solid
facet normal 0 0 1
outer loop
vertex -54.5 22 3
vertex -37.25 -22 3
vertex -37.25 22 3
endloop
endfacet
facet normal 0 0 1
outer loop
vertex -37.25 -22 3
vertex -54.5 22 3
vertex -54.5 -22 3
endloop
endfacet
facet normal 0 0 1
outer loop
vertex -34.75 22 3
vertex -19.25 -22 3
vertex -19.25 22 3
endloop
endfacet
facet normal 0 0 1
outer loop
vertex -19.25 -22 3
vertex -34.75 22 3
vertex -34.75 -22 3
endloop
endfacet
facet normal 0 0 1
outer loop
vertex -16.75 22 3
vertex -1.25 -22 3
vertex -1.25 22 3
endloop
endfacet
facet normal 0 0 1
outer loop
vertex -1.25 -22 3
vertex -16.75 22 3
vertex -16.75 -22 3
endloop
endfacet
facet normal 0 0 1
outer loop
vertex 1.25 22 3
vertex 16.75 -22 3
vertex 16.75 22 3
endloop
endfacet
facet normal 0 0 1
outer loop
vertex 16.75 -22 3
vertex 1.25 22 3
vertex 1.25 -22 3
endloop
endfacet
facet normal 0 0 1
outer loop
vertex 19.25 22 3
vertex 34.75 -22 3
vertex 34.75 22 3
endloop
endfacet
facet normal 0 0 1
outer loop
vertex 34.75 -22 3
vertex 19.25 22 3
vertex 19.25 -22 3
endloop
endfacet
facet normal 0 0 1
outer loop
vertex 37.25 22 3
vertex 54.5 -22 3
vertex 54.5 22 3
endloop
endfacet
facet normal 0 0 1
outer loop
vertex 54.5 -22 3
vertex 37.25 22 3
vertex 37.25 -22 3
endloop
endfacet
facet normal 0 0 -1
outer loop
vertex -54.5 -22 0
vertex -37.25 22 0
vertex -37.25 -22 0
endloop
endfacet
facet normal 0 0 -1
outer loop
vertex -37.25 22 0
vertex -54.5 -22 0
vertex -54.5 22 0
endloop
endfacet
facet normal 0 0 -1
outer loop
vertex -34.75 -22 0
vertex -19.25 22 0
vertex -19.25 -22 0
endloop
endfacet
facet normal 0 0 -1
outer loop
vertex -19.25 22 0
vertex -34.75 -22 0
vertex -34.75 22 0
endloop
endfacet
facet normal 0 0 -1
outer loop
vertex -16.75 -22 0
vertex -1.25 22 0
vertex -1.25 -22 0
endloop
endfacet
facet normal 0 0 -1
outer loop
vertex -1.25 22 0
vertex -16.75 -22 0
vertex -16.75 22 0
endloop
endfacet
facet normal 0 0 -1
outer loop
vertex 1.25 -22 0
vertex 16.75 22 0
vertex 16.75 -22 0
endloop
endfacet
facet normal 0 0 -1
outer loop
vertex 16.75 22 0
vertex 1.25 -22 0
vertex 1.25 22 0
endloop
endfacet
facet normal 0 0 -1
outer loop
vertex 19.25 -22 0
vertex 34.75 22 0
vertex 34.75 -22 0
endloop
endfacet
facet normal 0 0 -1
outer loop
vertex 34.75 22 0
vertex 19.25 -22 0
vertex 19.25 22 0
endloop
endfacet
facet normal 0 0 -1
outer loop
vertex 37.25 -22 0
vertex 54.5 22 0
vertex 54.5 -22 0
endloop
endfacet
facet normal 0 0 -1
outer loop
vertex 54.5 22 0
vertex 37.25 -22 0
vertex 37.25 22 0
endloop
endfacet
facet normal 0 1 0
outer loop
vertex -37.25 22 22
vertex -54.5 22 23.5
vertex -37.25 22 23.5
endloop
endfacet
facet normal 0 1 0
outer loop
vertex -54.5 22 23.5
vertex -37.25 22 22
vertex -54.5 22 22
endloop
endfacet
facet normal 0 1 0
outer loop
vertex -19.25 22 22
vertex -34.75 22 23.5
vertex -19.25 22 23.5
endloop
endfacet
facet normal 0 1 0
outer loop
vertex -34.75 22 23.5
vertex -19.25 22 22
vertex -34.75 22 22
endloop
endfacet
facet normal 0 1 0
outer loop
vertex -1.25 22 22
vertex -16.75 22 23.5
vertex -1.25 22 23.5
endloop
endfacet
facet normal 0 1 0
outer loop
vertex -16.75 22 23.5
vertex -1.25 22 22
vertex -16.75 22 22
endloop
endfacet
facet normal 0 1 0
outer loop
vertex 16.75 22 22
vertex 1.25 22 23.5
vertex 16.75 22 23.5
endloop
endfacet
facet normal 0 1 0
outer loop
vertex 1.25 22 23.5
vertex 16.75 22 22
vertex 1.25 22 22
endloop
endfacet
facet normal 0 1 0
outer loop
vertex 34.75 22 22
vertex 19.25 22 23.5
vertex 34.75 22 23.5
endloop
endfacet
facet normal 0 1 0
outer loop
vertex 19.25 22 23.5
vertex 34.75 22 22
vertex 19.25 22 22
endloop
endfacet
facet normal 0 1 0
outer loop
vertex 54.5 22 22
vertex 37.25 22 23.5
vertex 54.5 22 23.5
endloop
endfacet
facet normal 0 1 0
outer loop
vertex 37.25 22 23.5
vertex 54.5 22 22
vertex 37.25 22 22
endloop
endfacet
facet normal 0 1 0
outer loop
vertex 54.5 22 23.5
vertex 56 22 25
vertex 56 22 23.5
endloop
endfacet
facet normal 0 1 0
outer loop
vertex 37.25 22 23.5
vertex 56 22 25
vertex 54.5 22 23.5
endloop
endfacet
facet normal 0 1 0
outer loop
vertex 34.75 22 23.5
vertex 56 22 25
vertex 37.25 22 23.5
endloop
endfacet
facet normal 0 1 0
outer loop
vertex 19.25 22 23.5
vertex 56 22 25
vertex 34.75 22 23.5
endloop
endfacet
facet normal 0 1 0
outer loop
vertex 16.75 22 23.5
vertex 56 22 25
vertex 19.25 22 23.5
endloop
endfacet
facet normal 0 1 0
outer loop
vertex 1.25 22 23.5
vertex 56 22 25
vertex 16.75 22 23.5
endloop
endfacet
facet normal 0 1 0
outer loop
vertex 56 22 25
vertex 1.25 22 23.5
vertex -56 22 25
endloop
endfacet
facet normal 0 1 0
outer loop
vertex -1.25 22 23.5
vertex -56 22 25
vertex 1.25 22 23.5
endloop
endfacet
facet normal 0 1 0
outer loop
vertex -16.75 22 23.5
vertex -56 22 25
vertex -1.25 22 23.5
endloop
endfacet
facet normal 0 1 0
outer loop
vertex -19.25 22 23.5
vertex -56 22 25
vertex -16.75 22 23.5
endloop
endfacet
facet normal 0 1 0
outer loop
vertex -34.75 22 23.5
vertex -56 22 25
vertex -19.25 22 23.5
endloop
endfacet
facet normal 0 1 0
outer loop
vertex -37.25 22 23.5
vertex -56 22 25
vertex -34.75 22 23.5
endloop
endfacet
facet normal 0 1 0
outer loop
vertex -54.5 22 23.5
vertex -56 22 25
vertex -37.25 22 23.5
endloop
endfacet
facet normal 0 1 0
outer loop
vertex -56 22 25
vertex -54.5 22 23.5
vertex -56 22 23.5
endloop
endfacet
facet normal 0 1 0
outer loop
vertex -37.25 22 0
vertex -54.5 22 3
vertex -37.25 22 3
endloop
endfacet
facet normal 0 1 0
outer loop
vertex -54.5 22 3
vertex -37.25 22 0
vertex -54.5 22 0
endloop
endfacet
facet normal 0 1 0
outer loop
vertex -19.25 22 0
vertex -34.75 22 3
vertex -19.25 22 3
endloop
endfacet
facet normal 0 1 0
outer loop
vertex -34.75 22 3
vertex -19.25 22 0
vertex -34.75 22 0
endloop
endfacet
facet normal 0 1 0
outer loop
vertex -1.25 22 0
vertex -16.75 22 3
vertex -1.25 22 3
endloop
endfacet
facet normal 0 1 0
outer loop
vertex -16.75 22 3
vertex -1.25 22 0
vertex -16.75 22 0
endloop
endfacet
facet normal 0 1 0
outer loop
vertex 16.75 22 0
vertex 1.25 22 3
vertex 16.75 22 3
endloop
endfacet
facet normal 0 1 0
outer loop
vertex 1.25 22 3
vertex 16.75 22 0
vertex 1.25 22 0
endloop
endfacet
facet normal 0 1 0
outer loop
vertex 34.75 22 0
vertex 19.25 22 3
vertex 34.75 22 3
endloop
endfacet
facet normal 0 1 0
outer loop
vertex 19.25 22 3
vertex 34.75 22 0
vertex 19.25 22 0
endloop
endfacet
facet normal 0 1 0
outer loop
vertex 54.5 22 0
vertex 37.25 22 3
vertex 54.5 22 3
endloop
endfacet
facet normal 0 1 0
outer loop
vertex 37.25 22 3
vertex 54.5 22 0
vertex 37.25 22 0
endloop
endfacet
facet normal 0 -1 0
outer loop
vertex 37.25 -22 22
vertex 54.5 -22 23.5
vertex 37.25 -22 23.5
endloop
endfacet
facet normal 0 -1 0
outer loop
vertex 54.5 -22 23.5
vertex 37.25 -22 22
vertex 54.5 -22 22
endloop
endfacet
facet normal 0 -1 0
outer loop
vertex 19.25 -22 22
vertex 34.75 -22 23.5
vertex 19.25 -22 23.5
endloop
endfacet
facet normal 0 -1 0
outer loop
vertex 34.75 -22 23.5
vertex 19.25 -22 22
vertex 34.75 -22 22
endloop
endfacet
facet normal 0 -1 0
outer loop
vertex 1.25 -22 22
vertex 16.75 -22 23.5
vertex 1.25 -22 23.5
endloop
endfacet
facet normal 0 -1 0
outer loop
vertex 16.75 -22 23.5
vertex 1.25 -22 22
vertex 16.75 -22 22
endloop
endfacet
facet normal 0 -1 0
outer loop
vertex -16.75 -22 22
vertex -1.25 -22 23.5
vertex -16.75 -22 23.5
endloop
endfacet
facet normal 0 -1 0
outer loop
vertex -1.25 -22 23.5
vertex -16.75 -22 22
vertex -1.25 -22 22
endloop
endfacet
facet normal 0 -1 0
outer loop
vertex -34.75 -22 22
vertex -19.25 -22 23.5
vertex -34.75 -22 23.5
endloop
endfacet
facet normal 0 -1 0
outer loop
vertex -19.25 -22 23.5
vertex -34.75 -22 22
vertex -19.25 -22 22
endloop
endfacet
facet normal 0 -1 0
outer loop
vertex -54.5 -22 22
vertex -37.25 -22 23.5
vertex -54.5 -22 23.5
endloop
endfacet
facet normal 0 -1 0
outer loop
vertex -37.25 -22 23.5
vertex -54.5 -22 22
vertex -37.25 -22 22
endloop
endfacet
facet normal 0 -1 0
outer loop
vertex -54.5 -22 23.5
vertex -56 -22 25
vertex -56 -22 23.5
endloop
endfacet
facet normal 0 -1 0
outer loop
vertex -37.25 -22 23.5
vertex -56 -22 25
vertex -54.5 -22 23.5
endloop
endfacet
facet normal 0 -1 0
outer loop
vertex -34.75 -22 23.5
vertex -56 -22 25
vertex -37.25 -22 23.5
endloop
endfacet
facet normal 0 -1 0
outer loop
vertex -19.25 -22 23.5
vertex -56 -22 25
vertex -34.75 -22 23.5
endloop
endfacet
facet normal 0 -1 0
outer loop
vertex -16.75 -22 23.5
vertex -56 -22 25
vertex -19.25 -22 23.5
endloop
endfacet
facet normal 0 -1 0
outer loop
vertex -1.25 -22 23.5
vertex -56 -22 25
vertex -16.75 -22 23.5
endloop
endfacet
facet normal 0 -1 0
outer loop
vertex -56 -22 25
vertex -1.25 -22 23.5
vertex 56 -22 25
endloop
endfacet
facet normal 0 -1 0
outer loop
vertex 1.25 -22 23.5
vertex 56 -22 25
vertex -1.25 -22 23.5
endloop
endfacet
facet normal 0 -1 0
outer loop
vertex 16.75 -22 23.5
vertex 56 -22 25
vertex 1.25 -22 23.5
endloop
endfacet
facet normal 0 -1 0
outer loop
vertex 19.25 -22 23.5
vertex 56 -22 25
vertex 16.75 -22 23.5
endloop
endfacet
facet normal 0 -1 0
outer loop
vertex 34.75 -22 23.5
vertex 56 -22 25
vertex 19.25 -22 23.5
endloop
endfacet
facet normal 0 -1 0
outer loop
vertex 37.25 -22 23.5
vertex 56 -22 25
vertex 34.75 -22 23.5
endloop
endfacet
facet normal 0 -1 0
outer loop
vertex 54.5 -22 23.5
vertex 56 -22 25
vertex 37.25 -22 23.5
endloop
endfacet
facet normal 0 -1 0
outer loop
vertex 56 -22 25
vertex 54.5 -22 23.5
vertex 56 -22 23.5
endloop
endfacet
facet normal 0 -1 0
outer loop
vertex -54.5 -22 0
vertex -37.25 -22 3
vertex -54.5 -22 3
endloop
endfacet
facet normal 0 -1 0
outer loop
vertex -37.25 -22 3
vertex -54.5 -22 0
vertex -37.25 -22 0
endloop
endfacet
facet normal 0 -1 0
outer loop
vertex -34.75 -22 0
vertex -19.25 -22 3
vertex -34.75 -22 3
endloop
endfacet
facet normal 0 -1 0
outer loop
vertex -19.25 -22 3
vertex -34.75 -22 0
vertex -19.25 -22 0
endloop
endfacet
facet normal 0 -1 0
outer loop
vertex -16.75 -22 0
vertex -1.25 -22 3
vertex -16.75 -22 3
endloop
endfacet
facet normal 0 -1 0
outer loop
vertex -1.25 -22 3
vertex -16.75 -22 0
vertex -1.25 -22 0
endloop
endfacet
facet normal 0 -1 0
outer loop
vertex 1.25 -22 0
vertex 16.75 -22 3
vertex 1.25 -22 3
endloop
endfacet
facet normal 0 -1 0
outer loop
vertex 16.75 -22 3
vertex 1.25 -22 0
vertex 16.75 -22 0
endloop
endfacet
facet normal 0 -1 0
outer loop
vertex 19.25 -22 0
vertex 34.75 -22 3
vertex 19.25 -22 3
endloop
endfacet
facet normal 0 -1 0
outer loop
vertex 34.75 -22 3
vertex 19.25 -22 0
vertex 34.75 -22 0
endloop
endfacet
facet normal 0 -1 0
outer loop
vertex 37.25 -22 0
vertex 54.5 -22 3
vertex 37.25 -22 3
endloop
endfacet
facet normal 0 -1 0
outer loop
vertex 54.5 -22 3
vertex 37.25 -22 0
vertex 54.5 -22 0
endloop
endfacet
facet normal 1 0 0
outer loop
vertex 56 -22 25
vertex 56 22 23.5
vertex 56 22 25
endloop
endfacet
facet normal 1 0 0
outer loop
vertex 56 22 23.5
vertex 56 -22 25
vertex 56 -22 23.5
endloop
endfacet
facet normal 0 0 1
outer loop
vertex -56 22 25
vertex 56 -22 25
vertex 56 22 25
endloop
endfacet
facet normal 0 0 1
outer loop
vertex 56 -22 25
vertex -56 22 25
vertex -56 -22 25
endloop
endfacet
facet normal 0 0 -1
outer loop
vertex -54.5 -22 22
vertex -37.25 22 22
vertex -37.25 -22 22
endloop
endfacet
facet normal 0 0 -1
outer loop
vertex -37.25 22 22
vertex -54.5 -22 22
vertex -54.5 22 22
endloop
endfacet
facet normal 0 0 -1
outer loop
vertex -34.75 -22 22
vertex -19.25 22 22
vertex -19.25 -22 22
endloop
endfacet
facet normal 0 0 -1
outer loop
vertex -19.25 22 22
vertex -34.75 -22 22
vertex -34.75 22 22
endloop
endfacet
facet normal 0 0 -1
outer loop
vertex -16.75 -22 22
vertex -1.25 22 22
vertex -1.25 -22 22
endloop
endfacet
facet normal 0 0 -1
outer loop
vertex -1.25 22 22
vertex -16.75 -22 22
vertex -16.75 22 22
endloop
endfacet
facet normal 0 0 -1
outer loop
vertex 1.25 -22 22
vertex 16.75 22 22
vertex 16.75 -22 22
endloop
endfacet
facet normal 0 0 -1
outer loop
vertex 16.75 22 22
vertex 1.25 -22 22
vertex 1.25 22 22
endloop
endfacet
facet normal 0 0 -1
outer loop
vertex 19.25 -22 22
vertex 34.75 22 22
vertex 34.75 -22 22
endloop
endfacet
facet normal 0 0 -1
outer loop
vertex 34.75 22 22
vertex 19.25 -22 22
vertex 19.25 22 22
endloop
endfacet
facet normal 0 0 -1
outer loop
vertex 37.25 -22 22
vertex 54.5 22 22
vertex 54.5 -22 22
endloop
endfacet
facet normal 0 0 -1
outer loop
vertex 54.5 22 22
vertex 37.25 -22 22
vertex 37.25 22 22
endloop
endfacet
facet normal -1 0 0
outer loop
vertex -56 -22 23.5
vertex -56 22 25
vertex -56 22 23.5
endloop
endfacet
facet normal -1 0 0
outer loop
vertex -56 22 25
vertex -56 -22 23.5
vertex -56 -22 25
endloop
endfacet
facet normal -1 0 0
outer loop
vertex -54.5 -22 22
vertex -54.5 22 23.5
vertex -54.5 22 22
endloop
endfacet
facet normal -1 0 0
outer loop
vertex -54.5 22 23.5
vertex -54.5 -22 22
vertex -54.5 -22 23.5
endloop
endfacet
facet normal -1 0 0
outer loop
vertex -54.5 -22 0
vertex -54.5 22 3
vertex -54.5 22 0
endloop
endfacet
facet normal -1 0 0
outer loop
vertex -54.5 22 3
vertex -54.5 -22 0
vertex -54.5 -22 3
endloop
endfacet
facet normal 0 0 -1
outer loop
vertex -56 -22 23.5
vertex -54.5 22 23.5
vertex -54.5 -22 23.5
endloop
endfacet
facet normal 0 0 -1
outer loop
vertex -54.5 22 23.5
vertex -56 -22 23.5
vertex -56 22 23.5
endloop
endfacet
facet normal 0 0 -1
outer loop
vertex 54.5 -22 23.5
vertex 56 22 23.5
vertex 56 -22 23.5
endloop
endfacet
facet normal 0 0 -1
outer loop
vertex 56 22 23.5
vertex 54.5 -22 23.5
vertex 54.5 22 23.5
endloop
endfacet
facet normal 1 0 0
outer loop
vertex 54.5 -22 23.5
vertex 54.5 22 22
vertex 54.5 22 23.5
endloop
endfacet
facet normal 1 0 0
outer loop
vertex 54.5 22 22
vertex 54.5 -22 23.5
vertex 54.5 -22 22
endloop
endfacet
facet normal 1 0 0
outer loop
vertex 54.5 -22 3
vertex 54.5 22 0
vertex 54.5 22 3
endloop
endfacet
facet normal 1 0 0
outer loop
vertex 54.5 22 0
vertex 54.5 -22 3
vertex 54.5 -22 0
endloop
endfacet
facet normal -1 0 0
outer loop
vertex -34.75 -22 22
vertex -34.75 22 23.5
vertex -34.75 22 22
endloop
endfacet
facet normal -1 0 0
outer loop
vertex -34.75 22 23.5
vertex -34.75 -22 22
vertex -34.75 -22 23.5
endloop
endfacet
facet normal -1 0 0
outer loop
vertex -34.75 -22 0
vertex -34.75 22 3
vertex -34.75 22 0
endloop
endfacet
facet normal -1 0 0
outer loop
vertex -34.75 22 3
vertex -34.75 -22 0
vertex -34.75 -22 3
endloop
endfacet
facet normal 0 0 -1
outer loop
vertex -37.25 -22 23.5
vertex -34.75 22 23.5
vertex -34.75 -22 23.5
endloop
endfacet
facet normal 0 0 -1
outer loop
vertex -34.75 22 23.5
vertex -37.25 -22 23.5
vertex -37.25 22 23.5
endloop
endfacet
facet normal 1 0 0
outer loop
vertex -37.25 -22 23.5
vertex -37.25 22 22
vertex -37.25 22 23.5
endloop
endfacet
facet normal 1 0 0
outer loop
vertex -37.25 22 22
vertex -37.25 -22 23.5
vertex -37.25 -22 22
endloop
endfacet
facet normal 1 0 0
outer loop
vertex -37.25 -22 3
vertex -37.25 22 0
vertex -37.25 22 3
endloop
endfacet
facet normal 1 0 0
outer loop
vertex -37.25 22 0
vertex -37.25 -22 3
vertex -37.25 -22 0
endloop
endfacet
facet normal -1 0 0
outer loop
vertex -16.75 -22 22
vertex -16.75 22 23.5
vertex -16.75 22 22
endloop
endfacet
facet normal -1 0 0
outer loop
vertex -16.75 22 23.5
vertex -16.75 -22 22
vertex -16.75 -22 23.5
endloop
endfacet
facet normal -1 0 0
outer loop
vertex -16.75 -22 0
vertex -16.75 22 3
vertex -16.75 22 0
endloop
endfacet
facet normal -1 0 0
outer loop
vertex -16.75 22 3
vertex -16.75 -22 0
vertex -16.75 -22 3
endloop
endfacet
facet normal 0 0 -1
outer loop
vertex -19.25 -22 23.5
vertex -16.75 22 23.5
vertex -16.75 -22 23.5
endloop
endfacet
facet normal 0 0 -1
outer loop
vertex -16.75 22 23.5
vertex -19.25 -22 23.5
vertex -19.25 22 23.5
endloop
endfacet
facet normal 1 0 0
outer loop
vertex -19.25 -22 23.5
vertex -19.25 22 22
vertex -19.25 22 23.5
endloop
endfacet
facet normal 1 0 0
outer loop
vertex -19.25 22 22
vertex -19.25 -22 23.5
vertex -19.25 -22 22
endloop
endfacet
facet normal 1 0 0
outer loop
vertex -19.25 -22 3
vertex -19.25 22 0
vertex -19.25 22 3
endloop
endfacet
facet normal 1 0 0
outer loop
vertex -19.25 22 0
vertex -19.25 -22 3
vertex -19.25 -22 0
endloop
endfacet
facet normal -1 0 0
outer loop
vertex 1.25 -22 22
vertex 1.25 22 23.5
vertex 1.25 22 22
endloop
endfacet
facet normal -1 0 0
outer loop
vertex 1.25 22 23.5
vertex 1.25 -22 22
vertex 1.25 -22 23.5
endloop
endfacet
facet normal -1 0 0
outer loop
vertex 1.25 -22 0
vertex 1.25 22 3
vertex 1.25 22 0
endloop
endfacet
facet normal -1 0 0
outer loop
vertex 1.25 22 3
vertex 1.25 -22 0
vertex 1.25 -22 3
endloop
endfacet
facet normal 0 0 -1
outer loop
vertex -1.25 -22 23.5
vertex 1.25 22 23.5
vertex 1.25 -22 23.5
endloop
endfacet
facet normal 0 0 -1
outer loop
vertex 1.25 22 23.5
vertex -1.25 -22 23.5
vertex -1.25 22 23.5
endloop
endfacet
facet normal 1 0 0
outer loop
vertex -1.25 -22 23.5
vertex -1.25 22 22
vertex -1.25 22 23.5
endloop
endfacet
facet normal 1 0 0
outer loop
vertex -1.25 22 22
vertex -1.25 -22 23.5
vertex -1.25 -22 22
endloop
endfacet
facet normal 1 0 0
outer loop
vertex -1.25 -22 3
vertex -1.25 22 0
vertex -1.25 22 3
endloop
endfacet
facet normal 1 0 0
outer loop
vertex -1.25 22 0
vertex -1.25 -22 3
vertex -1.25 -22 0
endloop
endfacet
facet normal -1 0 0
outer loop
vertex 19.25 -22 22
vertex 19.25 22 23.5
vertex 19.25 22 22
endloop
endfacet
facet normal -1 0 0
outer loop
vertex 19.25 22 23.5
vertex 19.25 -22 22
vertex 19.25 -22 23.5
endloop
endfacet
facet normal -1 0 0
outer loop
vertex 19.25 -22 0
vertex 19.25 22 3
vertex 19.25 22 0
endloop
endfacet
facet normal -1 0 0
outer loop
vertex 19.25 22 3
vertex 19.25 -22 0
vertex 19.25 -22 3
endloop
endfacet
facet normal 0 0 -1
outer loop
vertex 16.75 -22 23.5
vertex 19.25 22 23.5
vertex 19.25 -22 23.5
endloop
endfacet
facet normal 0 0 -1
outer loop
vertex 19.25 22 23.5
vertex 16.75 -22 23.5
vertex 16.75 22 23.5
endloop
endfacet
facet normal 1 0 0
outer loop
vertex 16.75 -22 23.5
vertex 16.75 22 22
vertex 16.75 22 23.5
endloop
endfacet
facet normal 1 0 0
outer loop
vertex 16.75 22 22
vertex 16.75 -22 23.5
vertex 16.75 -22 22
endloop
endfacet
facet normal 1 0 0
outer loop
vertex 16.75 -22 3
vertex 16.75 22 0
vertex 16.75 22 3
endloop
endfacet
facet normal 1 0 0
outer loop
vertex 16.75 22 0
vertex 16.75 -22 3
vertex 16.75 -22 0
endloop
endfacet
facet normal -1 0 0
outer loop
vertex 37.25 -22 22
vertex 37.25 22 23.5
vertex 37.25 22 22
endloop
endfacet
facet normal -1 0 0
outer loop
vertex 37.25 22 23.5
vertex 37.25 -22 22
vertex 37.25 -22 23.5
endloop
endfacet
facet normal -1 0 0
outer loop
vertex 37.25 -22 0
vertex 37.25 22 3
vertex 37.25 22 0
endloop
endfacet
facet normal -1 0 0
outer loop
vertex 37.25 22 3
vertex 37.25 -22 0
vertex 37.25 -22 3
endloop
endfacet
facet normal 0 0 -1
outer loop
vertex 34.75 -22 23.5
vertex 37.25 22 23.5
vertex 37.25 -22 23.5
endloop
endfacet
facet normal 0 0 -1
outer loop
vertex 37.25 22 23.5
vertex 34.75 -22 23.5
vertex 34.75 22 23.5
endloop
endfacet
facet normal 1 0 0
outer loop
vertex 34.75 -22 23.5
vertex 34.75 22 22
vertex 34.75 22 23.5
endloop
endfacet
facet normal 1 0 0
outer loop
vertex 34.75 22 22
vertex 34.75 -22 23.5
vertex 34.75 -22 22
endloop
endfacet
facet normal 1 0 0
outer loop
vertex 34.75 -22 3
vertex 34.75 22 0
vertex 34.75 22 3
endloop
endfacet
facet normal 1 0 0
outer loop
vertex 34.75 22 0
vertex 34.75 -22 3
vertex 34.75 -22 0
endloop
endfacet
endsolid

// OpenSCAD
// Built by bench/smallmodels/features/compiler.py from a list of features.
$fn = 64;
difference() {
  union() {
    translate([0, 0, 0]) translate([-56, -22, 0]) cube([112, 44, 3]);
    translate([0, 0, 22]) translate([-56, -22, 0]) cube([112, 44, 3]);
  }
  union() {
    translate([-56, 0, -1.5]) rotate([0, 0, 0]) translate([-1.5, -22, 0]) cube([3, 44, 25]);
    translate([56, 0, -1.5]) rotate([0, 0, 0]) translate([-1.5, -22, 0]) cube([3, 44, 25]);
    translate([-36, 0, -1.5]) rotate([0, 0, 0]) translate([-1.25, -22, 0]) cube([2.5, 44, 25]);
    translate([-18, 0, -1.5]) rotate([0, 0, 0]) translate([-1.25, -22, 0]) cube([2.5, 44, 25]);
    translate([0, 0, -1.5]) rotate([0, 0, 0]) translate([-1.25, -22, 0]) cube([2.5, 44, 25]);
    translate([18, 0, -1.5]) rotate([0, 0, 0]) translate([-1.25, -22, 0]) cube([2.5, 44, 25]);
    translate([36, 0, -1.5]) rotate([0, 0, 0]) translate([-1.25, -22, 0]) cube([2.5, 44, 25]);
  }
}
